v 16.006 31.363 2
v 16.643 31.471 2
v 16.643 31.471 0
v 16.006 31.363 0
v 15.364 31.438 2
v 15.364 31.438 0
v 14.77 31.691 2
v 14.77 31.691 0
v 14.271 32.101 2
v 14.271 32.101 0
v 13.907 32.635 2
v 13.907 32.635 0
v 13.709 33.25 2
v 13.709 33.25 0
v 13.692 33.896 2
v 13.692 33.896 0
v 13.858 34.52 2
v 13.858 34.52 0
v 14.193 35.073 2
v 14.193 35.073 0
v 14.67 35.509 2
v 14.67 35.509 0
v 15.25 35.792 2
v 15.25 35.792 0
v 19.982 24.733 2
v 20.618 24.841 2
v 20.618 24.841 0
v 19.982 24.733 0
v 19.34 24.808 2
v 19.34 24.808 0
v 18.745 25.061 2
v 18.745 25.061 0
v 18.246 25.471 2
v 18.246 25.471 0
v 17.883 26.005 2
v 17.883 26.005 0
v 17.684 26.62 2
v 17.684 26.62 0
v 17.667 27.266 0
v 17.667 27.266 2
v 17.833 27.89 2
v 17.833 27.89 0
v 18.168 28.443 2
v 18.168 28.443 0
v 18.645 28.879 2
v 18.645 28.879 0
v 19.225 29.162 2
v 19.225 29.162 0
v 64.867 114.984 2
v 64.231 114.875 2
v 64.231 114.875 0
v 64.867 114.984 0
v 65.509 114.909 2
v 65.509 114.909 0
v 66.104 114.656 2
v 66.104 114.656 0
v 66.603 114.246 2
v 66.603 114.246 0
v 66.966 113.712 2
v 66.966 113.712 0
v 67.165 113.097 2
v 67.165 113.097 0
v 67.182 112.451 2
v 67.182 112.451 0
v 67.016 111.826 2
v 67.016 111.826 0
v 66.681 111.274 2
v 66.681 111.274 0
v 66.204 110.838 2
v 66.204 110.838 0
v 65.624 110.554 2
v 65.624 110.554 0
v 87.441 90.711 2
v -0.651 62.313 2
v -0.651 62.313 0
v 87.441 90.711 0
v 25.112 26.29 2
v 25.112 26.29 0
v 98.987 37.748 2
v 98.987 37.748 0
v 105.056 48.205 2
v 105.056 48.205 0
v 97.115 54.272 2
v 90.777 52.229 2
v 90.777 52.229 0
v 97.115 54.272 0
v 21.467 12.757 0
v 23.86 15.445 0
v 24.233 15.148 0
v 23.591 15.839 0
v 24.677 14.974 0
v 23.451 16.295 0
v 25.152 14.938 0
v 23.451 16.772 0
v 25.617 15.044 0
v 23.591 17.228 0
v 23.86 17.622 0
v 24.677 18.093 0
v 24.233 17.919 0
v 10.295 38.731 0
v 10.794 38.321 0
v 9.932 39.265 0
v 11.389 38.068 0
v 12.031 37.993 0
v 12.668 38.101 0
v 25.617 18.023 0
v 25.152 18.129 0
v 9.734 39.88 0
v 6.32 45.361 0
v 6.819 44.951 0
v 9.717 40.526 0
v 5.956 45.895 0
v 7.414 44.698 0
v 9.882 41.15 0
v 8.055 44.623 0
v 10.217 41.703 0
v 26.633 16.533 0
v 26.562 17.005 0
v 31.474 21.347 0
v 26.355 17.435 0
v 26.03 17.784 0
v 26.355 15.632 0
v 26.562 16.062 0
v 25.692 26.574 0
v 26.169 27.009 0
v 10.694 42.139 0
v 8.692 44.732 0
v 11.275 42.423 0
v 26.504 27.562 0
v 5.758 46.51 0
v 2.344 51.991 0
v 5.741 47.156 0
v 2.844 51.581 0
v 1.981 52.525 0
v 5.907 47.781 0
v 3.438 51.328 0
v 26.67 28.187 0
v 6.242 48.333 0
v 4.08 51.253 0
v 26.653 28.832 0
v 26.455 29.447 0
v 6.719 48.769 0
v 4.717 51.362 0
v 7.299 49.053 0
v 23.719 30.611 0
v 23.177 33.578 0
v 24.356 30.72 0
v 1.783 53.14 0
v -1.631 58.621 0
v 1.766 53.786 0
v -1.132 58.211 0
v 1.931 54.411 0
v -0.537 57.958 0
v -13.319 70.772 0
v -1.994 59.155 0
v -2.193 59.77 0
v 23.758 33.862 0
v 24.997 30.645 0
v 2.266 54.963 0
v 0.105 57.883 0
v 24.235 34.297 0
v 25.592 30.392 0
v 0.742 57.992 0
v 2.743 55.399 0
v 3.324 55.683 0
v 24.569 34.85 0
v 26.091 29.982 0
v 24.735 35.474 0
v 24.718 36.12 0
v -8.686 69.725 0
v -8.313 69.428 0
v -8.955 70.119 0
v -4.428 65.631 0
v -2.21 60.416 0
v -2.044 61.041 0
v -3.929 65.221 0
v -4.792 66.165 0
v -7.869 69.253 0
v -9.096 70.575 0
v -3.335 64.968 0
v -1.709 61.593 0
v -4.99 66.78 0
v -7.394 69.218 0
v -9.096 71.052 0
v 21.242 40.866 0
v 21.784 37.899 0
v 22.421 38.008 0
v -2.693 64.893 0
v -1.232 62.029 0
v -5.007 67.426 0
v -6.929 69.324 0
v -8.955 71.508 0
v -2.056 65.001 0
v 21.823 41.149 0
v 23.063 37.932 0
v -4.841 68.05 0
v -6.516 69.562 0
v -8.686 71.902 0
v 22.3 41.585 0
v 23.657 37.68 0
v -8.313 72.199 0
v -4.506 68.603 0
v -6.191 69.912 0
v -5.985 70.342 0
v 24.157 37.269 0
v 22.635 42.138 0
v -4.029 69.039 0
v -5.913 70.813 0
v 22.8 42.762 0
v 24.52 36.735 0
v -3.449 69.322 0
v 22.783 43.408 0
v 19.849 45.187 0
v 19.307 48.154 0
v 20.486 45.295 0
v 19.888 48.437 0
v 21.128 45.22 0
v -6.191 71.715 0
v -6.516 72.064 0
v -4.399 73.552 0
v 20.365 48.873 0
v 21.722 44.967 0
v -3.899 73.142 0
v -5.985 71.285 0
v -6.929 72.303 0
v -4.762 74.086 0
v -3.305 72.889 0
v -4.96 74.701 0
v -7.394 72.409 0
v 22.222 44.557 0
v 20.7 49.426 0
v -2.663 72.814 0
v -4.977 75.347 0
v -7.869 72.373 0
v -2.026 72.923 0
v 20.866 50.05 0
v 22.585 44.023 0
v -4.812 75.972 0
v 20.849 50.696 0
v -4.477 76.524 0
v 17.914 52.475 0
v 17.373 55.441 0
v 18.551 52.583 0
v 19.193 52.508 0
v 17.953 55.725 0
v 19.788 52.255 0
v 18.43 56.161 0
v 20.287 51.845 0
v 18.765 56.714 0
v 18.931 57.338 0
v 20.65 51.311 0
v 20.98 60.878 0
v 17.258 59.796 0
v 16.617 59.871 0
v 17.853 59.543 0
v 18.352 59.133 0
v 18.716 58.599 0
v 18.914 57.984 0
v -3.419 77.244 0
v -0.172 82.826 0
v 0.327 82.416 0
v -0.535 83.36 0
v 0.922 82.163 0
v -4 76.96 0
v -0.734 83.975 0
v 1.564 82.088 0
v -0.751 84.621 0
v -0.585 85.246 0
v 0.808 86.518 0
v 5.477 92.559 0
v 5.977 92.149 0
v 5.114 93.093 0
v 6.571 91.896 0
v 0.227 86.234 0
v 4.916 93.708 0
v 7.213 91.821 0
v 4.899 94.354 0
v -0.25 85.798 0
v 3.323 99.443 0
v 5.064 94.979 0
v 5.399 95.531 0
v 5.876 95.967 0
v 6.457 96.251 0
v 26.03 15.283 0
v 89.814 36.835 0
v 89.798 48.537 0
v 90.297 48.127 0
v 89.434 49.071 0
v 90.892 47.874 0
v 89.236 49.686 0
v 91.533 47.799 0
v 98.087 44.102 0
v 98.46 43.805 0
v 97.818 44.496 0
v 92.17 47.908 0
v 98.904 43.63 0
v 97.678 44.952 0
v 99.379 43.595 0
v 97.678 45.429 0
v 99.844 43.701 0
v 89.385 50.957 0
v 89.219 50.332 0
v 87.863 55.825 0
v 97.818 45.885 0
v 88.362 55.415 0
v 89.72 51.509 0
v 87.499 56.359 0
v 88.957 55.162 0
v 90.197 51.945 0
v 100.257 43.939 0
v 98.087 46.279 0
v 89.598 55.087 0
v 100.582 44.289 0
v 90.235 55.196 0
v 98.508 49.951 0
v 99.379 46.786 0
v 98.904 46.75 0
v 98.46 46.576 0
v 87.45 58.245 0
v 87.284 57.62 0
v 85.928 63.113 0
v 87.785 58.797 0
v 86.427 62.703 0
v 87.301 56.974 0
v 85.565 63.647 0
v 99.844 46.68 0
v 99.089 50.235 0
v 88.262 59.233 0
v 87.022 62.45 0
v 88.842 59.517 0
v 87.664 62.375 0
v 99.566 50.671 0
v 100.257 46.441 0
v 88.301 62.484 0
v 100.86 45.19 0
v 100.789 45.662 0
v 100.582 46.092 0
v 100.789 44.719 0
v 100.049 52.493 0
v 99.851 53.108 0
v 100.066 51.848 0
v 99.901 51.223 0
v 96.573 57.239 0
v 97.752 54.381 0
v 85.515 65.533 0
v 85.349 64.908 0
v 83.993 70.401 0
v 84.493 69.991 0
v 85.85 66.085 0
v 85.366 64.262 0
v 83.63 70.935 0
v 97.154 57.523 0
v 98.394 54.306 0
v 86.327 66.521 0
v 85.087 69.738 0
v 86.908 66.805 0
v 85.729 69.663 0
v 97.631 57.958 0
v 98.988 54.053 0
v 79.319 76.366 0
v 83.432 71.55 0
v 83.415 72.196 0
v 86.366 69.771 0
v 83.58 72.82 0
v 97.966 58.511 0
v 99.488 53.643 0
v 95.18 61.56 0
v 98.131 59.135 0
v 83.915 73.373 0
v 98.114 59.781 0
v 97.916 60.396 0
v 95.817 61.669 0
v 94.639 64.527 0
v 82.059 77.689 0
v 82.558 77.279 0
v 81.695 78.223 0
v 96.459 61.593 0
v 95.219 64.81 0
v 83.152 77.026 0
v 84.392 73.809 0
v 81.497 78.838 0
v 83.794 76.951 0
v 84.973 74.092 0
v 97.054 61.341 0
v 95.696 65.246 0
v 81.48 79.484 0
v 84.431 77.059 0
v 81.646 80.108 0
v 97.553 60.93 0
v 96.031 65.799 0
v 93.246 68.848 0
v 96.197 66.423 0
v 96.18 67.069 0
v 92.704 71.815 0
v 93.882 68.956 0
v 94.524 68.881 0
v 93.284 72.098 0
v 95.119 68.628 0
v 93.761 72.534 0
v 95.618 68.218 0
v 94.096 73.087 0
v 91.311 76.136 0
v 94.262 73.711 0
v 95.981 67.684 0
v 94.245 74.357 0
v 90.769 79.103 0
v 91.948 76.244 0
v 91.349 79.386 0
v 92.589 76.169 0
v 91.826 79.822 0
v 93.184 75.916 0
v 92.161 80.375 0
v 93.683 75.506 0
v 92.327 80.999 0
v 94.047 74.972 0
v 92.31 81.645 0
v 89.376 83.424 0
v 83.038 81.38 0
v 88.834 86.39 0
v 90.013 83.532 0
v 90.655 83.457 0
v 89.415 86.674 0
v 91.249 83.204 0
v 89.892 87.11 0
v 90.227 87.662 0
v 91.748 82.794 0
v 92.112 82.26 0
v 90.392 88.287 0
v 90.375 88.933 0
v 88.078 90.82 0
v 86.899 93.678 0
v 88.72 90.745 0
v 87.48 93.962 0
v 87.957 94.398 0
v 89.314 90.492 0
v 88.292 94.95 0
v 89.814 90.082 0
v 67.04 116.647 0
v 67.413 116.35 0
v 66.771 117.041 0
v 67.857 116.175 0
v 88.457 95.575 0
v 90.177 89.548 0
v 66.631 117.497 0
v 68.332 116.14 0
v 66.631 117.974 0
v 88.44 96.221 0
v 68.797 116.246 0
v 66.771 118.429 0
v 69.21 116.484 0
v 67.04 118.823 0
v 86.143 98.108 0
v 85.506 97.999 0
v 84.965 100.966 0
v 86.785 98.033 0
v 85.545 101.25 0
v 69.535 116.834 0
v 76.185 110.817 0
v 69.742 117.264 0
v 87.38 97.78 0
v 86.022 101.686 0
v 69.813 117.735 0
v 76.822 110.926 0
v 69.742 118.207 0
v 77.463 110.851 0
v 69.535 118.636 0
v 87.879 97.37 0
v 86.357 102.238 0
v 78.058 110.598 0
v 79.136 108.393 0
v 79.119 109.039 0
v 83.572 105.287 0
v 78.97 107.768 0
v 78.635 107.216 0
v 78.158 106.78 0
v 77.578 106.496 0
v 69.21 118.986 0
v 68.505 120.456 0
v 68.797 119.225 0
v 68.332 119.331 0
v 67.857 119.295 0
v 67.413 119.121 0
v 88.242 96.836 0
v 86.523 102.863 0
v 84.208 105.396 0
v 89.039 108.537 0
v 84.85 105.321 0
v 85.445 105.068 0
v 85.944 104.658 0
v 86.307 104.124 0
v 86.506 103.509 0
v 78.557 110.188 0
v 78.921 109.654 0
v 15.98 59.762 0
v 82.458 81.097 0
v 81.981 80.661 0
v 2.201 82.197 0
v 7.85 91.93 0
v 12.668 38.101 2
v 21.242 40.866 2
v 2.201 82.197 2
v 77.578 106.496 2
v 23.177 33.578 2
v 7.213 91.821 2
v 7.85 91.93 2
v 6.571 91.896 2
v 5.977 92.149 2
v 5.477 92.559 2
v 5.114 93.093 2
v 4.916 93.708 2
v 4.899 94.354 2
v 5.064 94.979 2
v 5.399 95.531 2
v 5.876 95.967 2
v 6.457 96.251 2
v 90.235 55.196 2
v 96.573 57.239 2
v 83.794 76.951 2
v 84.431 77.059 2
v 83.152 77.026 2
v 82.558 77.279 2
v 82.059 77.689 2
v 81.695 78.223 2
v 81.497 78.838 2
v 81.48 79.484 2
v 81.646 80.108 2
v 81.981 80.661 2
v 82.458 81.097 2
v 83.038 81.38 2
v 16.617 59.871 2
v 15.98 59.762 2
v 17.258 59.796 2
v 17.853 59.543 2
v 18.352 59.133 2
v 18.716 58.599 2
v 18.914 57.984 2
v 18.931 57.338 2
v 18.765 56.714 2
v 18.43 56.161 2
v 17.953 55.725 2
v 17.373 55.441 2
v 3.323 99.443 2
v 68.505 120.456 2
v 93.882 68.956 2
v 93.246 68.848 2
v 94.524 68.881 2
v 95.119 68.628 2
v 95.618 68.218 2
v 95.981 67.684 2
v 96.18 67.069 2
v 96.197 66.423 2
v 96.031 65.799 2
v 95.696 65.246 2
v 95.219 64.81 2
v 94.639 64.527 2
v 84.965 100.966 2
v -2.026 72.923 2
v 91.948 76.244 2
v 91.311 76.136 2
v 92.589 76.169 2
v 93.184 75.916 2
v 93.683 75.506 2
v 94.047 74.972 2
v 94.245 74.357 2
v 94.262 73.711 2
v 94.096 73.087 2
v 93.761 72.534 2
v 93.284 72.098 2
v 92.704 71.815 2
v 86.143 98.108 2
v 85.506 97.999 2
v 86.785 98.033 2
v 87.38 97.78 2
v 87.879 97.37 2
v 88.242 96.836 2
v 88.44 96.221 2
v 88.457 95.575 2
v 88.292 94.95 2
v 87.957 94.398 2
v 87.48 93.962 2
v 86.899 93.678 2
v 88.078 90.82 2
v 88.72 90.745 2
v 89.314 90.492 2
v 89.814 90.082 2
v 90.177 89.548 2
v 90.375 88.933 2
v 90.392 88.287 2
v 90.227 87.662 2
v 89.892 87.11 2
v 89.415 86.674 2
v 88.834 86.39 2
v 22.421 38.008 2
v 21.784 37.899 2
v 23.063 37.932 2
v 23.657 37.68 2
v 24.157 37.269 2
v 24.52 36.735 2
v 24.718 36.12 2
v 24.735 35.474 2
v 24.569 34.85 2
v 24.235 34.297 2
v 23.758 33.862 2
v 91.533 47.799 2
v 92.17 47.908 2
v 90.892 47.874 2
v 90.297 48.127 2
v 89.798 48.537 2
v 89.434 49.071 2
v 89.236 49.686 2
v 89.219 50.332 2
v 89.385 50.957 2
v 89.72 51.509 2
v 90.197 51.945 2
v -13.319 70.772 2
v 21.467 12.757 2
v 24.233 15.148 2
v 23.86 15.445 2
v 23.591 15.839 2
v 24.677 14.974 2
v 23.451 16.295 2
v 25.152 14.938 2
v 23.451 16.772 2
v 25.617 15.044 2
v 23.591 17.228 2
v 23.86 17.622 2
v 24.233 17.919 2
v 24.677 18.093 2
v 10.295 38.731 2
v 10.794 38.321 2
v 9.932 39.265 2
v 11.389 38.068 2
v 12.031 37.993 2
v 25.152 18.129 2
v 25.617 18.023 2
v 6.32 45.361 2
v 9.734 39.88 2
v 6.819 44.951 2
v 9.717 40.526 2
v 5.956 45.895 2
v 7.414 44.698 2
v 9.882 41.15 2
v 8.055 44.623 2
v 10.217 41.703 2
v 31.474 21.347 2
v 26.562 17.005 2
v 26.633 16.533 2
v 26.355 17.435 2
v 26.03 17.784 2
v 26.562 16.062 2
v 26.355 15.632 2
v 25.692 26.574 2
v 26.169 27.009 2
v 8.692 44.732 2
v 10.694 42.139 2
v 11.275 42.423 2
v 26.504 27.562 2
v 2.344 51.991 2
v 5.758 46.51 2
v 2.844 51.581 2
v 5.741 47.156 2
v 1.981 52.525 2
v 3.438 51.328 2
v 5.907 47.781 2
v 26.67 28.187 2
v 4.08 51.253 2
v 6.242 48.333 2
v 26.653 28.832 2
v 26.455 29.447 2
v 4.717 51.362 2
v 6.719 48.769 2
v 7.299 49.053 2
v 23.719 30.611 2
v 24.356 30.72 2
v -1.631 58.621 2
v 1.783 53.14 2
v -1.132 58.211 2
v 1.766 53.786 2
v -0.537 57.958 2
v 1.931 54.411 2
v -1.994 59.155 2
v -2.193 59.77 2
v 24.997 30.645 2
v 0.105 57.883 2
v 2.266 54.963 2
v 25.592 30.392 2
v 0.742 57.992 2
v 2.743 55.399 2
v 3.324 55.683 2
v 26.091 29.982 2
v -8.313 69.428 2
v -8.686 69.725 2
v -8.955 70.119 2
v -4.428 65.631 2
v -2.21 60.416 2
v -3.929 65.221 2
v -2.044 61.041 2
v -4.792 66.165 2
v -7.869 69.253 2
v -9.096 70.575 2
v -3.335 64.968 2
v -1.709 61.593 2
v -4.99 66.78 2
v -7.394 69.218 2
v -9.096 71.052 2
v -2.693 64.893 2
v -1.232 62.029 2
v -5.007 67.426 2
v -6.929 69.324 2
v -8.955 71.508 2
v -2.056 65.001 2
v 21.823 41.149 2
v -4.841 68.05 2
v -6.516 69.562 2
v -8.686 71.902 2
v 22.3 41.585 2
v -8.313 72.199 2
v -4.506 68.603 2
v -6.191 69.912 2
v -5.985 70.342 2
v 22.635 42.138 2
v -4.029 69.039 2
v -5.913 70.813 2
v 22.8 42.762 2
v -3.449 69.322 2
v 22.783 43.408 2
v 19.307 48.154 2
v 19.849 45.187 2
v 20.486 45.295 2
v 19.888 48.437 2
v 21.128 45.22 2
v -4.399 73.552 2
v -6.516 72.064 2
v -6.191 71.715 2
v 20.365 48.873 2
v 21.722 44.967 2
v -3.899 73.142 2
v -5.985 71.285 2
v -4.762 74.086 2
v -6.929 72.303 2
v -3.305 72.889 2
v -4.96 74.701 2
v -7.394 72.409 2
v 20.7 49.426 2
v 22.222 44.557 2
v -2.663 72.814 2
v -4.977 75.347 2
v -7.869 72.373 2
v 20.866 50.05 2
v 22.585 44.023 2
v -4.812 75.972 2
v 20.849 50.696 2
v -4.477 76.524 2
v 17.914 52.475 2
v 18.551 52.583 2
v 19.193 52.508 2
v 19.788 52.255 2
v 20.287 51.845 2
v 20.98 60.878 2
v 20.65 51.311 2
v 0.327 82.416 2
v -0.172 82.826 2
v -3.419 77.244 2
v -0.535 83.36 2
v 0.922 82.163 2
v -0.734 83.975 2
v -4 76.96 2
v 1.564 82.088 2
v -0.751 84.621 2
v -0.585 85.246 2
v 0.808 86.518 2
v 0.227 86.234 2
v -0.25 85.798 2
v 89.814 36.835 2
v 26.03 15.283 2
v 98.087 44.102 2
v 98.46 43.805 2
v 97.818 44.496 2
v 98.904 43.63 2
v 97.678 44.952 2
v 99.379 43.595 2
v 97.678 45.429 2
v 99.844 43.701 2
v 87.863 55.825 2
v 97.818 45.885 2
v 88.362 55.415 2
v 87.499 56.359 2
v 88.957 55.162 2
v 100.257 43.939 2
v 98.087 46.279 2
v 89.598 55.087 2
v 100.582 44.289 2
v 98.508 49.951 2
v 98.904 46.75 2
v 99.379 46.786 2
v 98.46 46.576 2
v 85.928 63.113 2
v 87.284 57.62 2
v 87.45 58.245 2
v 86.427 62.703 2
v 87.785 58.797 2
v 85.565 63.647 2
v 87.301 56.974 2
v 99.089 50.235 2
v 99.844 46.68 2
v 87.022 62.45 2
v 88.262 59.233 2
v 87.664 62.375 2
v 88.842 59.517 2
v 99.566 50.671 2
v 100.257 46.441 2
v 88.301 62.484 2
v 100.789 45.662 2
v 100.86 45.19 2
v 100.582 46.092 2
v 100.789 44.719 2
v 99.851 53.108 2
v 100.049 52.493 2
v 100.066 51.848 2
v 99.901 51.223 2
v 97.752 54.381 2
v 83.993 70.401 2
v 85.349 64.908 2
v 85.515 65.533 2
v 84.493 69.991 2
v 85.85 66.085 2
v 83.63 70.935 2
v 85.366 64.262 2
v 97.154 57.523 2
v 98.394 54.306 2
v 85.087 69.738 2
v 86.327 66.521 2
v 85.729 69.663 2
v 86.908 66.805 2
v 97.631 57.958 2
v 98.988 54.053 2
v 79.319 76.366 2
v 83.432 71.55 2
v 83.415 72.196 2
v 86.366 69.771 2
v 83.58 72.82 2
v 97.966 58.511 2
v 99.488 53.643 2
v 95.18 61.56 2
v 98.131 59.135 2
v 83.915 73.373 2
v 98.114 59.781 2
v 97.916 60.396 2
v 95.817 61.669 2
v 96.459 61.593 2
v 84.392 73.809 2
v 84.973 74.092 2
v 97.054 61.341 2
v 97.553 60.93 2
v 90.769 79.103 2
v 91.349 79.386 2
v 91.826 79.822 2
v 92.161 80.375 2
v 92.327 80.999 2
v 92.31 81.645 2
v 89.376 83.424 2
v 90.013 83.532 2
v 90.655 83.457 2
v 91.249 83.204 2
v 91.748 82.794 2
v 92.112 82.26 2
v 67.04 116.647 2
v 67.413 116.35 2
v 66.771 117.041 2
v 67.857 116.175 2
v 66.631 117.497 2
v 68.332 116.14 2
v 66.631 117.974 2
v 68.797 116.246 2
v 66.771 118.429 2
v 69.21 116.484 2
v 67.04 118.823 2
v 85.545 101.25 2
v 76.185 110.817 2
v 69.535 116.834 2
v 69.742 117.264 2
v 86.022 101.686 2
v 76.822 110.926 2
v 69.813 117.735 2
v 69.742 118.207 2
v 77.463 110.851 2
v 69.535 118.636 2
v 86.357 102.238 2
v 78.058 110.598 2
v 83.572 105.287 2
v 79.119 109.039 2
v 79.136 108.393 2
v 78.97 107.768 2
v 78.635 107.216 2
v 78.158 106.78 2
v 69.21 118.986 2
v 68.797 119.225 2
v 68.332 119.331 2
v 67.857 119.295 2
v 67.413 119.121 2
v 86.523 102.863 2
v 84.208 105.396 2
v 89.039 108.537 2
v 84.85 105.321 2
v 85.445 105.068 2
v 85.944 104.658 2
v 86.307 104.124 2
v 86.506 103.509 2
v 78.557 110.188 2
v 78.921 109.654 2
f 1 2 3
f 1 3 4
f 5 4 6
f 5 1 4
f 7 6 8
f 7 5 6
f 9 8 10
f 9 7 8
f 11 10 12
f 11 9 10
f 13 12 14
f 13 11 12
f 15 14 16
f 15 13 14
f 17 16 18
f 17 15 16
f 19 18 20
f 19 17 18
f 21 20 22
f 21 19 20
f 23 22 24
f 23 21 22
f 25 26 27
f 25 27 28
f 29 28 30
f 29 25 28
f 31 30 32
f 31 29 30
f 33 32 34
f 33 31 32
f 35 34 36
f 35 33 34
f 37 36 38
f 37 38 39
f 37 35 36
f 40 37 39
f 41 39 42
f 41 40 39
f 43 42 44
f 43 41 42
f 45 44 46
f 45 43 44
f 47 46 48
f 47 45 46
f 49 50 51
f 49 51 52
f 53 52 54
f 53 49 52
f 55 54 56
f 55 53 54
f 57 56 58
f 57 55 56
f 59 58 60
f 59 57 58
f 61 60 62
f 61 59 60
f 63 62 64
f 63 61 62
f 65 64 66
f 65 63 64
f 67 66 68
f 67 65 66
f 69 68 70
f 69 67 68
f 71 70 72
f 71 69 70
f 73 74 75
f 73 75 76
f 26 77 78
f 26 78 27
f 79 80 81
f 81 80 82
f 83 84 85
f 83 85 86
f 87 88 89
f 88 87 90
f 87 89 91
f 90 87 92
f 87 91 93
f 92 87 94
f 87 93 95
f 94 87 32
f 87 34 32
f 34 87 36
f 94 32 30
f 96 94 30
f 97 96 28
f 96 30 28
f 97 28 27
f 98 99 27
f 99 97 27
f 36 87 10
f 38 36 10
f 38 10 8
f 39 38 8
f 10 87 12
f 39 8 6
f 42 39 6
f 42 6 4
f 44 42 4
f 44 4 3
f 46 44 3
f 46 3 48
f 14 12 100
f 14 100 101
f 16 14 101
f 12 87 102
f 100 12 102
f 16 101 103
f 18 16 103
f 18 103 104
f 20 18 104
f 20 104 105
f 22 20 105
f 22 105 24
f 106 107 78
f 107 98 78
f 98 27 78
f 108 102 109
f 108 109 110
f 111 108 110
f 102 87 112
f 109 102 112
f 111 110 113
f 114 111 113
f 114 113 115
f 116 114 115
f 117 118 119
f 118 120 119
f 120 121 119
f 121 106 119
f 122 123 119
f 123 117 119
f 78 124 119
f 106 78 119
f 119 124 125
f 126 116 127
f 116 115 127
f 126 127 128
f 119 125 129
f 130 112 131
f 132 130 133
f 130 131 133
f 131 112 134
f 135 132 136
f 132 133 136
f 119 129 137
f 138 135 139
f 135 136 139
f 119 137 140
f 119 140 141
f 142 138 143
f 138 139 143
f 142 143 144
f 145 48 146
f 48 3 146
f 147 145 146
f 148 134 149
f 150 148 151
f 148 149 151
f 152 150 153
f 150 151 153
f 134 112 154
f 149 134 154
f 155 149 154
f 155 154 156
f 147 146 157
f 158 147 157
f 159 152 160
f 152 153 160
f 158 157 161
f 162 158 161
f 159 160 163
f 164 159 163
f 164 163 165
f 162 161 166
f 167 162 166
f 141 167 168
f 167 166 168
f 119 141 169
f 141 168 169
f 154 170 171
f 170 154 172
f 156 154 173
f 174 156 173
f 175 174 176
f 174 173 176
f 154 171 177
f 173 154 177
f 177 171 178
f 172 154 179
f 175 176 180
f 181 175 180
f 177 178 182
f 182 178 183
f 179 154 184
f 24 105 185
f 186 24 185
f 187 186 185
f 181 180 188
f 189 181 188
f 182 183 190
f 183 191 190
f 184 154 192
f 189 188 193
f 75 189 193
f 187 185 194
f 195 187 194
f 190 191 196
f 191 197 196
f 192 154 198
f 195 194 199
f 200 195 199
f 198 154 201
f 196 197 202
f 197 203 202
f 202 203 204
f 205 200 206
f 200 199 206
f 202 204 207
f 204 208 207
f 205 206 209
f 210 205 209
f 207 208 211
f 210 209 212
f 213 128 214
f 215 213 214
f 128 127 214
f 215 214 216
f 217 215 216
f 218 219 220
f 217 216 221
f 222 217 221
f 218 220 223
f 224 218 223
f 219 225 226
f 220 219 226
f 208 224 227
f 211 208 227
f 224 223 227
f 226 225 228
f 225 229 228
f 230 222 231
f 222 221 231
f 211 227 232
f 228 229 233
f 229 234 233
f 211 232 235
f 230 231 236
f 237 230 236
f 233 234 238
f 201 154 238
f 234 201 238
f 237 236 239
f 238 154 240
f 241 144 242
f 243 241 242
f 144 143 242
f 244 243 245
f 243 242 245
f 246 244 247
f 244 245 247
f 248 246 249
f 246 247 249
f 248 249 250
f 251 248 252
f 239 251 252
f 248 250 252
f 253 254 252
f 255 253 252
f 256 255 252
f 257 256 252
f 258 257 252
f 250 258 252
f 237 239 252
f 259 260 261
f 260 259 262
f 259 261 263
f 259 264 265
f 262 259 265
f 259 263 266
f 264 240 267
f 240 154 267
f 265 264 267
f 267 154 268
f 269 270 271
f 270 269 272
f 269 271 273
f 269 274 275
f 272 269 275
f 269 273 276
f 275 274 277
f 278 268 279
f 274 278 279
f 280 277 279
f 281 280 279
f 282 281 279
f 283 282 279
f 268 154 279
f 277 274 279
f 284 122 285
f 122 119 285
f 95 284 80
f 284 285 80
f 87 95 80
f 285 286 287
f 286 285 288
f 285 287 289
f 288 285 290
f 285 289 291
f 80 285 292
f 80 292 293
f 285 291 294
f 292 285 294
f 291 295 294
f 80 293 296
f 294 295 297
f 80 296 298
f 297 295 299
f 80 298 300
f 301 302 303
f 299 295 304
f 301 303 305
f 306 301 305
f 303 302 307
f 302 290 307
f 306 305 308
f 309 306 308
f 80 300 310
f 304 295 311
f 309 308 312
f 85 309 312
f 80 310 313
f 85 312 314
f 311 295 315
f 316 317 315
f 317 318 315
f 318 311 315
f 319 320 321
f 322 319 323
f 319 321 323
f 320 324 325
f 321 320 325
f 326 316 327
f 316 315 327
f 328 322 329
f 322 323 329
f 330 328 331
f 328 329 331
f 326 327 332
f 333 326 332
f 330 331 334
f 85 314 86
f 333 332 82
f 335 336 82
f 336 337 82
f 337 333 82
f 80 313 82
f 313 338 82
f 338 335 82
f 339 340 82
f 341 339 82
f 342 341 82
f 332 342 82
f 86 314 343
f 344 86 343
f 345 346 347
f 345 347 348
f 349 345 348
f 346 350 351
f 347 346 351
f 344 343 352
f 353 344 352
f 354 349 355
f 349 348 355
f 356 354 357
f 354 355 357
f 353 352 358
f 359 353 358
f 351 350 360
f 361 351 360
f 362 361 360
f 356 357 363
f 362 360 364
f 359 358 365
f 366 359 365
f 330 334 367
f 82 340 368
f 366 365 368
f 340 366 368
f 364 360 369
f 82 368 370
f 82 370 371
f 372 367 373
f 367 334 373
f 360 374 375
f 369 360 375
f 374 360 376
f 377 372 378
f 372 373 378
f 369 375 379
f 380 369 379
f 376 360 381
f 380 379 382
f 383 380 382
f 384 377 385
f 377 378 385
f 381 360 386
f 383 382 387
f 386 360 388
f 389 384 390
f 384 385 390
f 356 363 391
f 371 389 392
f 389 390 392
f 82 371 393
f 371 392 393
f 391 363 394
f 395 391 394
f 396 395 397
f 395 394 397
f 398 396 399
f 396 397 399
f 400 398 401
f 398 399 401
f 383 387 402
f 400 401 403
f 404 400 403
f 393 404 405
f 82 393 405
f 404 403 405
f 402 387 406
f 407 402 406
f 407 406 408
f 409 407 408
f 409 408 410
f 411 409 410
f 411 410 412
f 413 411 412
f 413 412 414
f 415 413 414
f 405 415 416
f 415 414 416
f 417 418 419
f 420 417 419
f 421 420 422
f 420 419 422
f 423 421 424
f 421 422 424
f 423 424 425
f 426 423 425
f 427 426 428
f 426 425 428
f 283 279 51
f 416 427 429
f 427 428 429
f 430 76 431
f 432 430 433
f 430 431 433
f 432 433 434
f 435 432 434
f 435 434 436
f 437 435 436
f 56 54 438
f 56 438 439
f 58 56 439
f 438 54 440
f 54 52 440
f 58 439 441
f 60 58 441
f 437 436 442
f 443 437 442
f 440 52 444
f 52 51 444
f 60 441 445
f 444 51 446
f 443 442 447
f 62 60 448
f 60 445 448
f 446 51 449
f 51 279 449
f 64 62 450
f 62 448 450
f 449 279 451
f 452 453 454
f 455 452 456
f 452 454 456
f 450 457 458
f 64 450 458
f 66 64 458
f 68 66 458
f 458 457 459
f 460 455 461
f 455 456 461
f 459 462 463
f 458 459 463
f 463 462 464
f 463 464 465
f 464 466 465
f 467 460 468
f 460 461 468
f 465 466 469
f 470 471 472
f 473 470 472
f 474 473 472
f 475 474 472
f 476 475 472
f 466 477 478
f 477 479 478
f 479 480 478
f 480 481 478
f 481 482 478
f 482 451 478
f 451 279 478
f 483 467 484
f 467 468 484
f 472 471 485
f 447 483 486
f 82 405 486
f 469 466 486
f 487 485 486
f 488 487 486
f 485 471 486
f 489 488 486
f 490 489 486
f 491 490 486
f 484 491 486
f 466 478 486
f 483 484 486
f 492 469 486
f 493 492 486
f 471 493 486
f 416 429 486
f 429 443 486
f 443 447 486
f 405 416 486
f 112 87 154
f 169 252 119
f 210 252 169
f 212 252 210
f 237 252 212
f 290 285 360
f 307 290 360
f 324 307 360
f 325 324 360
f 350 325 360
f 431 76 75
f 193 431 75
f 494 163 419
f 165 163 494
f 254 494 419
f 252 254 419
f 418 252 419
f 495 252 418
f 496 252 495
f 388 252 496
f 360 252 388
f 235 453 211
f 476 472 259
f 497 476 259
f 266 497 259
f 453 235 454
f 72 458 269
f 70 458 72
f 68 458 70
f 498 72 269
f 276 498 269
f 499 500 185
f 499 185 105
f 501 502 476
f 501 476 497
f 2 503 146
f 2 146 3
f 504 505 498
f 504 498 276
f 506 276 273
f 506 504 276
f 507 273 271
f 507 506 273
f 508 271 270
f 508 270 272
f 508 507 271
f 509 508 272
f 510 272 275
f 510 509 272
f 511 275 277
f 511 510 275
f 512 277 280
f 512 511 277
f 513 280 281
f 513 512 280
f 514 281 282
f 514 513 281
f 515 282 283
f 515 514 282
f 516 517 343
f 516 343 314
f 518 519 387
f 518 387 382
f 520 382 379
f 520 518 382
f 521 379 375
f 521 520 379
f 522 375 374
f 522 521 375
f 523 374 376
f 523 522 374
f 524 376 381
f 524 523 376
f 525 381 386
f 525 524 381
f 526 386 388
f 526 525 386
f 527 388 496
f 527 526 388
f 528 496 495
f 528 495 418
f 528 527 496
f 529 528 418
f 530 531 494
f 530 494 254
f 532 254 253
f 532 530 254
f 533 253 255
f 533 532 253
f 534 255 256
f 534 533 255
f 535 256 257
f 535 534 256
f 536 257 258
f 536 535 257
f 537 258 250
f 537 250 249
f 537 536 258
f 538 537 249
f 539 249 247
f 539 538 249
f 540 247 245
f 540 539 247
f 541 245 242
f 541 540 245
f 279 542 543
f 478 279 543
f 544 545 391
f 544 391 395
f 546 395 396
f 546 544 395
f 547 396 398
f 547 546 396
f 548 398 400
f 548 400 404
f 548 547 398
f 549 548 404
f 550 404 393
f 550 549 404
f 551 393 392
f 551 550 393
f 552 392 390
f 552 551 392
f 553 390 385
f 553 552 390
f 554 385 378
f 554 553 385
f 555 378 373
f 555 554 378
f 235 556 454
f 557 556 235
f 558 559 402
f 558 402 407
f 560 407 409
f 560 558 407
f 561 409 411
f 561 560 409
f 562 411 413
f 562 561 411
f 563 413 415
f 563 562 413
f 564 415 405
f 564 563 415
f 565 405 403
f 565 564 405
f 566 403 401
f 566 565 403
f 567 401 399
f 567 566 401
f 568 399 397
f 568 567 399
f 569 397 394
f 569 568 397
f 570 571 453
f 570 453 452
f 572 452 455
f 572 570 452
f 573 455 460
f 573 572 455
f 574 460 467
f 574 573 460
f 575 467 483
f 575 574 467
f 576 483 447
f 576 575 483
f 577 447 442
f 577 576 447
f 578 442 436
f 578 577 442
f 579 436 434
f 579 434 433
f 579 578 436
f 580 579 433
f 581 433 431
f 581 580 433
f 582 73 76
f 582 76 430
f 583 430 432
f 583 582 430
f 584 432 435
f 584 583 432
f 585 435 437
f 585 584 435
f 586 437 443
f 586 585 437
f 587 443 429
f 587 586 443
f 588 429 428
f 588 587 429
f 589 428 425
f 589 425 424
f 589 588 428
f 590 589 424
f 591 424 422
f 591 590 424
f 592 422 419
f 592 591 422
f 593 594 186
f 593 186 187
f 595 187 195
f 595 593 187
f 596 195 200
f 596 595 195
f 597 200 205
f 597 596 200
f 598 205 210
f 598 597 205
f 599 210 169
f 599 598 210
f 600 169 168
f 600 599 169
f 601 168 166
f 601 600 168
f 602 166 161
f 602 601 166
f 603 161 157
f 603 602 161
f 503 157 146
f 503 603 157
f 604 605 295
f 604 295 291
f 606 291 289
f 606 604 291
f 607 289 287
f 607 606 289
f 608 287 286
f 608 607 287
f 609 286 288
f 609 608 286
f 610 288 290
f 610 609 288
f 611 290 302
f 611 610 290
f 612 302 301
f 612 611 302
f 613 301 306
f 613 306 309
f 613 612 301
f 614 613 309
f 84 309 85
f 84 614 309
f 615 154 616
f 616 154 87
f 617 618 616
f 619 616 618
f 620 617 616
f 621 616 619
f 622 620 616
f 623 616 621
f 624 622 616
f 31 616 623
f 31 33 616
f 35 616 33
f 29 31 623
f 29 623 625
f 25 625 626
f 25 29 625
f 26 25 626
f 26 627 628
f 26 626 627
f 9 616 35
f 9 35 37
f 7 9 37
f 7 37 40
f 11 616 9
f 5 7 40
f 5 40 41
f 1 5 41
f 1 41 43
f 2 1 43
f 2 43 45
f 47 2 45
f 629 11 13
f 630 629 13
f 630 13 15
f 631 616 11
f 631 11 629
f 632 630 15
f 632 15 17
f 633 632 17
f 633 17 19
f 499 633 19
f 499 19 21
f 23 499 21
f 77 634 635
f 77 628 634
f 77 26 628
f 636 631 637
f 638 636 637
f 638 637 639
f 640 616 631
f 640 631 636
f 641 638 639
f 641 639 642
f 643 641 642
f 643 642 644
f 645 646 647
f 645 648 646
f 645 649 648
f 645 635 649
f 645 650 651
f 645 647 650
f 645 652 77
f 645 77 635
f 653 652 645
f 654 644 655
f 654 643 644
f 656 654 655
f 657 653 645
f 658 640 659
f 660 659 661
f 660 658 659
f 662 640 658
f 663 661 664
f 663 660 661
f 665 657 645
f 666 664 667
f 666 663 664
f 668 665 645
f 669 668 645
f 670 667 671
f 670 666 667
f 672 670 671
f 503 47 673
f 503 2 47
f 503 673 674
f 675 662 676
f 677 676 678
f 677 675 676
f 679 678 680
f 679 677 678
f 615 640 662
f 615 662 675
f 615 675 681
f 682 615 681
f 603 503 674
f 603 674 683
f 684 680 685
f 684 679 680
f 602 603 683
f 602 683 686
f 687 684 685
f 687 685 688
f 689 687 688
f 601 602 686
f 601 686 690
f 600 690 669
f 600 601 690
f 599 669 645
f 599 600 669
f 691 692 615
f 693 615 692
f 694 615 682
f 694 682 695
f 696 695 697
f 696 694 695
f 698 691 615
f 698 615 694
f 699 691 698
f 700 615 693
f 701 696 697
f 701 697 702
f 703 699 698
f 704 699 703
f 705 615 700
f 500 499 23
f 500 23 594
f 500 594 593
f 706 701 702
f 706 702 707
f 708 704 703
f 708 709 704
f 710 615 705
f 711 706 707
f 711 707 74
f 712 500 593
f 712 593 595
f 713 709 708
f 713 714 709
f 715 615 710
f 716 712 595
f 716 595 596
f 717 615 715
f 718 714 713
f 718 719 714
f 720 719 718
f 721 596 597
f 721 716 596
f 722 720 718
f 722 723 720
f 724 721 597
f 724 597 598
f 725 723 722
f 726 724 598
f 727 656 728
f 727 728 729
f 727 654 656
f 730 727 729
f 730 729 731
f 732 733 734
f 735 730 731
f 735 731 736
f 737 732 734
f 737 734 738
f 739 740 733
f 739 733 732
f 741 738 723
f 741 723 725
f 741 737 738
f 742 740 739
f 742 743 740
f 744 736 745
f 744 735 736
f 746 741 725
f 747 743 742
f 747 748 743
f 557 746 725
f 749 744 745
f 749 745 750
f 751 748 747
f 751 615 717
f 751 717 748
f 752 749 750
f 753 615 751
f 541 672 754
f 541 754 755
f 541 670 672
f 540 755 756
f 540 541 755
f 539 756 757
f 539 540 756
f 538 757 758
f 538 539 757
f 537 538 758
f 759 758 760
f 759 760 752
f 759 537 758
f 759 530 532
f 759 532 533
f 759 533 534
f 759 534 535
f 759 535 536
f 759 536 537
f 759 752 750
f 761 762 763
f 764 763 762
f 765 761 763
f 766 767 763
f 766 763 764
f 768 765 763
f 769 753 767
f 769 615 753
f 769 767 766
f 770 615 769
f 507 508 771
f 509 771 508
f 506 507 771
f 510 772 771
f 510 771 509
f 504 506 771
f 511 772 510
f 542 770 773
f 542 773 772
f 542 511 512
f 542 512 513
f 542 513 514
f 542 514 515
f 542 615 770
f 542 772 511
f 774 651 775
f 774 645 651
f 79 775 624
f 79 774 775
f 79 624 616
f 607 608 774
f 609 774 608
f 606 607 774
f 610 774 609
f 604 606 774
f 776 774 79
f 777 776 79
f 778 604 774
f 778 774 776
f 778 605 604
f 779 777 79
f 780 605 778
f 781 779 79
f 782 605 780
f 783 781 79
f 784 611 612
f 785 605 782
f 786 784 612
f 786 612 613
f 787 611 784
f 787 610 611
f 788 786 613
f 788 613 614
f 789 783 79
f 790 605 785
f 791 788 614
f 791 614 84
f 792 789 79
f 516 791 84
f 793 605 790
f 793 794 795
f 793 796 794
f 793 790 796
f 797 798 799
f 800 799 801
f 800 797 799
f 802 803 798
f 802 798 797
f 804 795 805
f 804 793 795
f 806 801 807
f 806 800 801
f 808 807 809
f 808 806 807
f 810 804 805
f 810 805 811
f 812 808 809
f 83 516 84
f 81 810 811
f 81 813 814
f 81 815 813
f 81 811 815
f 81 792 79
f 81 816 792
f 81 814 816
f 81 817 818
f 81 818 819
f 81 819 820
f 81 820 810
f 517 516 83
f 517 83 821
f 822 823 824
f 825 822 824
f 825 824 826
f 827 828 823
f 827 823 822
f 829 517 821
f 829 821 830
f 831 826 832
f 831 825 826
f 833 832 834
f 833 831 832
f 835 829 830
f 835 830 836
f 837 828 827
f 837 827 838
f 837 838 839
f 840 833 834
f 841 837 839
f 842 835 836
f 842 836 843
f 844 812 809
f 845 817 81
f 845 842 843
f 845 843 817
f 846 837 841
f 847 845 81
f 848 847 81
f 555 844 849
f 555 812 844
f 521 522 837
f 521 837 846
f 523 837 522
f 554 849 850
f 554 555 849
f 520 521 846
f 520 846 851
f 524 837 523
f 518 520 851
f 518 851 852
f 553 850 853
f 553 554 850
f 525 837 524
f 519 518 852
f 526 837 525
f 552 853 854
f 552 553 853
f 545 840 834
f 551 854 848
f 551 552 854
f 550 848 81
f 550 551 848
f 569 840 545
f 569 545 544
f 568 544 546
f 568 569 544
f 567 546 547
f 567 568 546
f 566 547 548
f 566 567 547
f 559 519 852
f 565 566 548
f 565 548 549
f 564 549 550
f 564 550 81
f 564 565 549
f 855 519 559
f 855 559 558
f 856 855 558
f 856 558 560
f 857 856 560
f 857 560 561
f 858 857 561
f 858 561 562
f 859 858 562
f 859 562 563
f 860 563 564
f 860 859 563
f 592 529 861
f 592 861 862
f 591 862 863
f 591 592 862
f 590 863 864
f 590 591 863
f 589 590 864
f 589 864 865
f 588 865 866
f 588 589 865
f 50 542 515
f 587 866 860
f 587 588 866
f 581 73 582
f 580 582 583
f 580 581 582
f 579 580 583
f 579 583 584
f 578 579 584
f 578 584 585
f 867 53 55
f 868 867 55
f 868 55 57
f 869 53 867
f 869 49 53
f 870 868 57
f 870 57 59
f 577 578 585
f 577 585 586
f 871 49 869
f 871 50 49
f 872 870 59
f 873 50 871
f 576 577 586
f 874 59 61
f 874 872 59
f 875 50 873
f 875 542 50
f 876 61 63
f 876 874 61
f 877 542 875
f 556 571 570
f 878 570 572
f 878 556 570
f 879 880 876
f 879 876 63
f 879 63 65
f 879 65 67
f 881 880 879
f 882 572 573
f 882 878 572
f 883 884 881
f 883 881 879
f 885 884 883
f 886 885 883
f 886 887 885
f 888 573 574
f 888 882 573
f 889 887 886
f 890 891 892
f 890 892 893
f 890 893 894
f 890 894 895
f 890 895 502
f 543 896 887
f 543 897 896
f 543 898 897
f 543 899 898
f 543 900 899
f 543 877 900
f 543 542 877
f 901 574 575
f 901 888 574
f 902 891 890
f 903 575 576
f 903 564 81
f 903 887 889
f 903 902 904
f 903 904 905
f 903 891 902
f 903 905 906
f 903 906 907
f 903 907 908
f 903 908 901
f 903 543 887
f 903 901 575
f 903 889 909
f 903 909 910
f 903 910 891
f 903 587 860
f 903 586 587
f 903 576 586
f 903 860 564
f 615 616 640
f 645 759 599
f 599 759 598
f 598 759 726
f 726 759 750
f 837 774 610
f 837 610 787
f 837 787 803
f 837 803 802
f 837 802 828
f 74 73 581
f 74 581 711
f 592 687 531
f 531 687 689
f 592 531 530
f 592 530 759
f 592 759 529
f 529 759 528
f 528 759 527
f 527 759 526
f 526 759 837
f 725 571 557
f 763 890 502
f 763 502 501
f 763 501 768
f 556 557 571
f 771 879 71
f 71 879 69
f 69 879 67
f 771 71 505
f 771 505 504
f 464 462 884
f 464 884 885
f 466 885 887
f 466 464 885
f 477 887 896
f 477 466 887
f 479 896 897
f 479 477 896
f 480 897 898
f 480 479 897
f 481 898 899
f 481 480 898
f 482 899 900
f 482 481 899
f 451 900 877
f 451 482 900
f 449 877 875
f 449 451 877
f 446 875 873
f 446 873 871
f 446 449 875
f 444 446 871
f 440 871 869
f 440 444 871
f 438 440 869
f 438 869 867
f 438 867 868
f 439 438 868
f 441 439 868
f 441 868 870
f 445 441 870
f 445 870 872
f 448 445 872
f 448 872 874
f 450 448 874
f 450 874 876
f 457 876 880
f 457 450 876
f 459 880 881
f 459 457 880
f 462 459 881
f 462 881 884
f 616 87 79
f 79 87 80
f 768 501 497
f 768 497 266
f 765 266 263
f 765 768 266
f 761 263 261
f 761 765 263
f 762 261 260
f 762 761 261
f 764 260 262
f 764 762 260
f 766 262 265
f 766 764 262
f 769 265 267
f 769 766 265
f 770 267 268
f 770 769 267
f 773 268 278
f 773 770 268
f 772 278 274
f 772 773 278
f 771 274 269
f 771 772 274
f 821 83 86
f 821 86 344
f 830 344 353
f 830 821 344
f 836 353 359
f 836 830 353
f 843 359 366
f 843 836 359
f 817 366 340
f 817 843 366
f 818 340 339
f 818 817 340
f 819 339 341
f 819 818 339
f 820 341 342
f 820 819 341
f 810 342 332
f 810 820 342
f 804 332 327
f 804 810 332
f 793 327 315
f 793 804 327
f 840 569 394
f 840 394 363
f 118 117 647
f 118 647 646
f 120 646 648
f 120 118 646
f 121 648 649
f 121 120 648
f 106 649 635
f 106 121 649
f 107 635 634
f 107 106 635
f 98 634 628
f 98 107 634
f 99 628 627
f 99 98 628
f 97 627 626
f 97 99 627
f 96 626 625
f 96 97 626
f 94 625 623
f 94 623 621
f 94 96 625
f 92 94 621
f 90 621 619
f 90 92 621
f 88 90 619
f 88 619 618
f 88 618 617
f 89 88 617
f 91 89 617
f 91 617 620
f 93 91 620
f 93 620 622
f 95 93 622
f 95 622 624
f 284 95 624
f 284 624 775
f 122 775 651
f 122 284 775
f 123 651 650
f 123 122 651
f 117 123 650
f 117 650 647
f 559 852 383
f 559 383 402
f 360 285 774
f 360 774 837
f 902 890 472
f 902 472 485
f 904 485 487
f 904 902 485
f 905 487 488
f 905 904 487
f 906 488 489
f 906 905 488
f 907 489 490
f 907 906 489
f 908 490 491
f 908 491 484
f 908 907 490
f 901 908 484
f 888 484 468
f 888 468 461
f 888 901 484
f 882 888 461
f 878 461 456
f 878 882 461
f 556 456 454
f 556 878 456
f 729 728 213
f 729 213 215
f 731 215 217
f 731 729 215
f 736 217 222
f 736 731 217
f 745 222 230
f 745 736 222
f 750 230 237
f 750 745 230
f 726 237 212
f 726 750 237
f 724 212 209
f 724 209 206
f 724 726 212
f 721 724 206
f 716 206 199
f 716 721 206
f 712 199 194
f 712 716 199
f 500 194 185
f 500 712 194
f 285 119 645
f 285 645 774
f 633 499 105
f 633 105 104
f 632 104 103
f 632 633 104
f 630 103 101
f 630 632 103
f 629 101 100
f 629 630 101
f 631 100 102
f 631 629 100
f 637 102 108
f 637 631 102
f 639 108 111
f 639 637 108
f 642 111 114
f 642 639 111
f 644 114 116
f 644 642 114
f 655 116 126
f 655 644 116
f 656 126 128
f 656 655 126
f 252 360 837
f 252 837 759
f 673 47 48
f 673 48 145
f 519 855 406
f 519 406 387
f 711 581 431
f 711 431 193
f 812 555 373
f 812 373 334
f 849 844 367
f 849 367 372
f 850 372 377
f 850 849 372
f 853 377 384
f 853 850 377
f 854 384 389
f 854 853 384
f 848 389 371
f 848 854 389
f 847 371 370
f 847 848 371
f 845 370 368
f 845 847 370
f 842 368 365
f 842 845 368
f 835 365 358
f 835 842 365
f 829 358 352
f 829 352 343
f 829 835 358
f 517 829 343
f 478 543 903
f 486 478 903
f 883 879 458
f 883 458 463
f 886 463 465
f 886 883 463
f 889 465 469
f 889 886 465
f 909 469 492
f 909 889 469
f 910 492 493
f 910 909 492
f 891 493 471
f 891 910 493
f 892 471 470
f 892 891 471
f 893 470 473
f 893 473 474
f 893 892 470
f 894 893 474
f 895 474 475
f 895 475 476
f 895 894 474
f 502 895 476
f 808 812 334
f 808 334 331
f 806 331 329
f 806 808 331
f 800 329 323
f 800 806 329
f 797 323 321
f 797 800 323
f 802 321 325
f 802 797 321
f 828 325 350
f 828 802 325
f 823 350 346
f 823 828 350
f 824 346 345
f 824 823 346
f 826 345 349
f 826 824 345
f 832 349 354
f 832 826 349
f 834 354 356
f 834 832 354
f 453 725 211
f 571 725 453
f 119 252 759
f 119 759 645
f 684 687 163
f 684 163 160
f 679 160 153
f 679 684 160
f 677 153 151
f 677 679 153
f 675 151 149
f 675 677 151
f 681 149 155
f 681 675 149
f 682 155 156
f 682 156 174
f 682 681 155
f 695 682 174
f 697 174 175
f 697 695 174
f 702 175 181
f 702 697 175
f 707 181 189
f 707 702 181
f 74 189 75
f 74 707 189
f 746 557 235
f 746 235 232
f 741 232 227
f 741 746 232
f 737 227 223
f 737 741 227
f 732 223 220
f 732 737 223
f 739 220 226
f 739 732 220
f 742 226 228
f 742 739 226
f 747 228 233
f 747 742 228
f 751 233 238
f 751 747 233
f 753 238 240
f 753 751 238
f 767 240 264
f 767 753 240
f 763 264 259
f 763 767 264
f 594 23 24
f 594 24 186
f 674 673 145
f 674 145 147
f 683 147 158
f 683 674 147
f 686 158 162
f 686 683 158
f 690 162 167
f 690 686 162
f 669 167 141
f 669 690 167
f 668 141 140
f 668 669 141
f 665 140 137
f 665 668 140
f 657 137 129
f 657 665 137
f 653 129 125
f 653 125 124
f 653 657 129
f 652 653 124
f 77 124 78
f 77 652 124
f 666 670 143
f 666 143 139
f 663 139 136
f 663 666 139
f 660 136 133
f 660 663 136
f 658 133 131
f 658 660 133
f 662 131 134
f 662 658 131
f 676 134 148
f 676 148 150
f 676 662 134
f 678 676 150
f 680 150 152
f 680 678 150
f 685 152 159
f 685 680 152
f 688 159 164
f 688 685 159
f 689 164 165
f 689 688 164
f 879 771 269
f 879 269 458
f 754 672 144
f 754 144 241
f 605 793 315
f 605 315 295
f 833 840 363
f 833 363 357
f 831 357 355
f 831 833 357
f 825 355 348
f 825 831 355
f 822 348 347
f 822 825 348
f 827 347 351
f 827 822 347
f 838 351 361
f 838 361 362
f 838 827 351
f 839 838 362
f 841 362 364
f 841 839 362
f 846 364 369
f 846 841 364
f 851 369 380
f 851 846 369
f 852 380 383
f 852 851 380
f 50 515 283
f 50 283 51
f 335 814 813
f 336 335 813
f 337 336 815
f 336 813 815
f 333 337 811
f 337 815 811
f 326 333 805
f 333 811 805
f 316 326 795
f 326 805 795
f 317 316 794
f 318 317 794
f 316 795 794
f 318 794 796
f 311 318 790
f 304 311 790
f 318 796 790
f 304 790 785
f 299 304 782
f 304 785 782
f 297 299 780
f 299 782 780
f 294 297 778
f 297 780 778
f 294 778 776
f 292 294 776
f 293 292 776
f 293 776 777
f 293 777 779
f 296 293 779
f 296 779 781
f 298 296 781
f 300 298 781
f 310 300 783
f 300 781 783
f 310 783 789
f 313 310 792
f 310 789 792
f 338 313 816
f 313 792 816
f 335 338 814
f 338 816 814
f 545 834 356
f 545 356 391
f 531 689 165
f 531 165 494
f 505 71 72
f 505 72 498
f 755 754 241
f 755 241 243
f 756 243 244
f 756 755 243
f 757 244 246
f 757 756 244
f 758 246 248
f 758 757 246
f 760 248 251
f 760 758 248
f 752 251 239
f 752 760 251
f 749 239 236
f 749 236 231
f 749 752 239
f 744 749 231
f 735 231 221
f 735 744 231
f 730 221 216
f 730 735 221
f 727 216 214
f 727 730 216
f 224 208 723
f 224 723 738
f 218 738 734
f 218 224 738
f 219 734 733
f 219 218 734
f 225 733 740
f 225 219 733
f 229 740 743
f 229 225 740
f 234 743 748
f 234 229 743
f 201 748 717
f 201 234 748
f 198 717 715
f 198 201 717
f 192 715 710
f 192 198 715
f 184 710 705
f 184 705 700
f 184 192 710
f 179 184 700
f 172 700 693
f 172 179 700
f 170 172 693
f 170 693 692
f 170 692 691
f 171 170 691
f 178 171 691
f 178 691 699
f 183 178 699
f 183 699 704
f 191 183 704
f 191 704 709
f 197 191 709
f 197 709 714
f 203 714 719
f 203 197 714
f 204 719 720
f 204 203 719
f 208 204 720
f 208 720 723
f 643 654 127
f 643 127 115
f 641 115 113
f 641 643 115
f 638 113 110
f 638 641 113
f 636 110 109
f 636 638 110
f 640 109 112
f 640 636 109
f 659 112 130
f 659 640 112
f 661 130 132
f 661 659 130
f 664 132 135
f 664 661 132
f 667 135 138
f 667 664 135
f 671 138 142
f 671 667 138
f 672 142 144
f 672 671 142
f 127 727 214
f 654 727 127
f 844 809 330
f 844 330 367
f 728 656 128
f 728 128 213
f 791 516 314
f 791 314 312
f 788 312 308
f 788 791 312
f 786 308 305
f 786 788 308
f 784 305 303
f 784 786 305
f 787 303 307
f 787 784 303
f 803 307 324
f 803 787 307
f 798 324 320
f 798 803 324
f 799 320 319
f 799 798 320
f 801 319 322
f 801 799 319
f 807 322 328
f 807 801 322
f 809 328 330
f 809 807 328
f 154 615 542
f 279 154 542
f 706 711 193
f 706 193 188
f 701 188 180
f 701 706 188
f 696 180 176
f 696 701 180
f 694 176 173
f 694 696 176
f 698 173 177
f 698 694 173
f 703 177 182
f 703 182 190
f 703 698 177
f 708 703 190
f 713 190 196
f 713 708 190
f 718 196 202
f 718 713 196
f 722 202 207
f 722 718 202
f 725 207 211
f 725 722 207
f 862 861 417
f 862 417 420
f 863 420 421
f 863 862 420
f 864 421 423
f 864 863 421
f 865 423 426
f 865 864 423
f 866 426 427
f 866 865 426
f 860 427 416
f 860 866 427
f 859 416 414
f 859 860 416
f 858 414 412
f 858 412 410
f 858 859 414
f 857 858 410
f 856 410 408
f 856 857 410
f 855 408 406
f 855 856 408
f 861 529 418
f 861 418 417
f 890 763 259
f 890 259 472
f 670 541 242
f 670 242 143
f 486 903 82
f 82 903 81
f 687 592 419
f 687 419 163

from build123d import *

# Parameters (mm, degrees)
SKETCH1_R           = 1.6
BOSS_EXTRUDE1_DEPTH = 2
CUT_EXTRUDE1_DEPTH  = 2
SKETCH3_R           = 1.6
CUT_EXTRUDE2_DEPTH  = 2


with BuildPart() as part:
    # Sketch1 → Boss-Extrude1 (new body)
    with BuildSketch(Plane.XY):
        Polygon((21.467142273, 12.757289388), (98.986558646, 37.747522695), (108.606128903, 54.320788113), (91.526252569, 118.656423166), (69.674428961, 131.339810968), (5.135356345, 110.534101153), (-15.668691868, 74.691438373), align=None)
        with Locations((25.032859693, 16.533479235)):
            Circle(SKETCH1_R, mode=Mode.SUBTRACT)
        with Locations((-7.513458012, 70.813355701)):
            Circle(SKETCH1_R, mode=Mode.SUBTRACT)
        with Locations((68.212815702, 117.73514623)):
            Circle(SKETCH1_R, mode=Mode.SUBTRACT)
        Polygon((31.474266896, 21.347469407), (89.813558069, 36.835431526), (79.318927702, 76.366087142), (20.979636529, 60.878125023), align=None, mode=Mode.SUBTRACT)
    extrude(amount=BOSS_EXTRUDE1_DEPTH)

    # Sketch2 → Cut-Extrude1 (cut)
    with BuildSketch(Plane.XY.offset(2)):
        Polygon((68.505138354, 120.456079177), (89.039456874, 108.537406864), (105.056492564, 48.205227479), (108.606128903, 54.320788113), (91.526252569, 118.656423166), (69.674428961, 131.339810968), (5.135356345, 110.534101153), (-15.668691868, 74.691438373), (-13.318631122, 70.77207004), (3.322736479, 99.442976827), align=None)
    extrude(amount=-CUT_EXTRUDE1_DEPTH, mode=Mode.SUBTRACT)

    # Sketch3 → Cut-Extrude2 (cut)
    with BuildSketch(Plane.XY.offset(2)):
        with Locations((99.259718064, 45.190330298)):
            Circle(SKETCH3_R)
        with BuildLine():
            Line((6.456725485, 96.250579726), (64.230526779, 114.875342927))
            ThreePointArc((64.230526779, 114.875342927), (67.087527478, 113.411325508), (65.623510059, 110.554324808))
            Line((65.623510059, 110.554324808), (7.849708766, 91.929561608))
            ThreePointArc((7.849708766, 91.929561608), (4.992708066, 93.393579027), (6.456725485, 96.250579726))
        make_face()
        with BuildLine():
            Line((0.807577645, 86.517834494), (76.18470113, 110.817448579))
            ThreePointArc((76.18470113, 110.817448579), (79.041701829, 109.35343116), (77.57768441, 106.496430461))
            Line((77.57768441, 106.496430461), (2.200560925, 82.196816376))
            ThreePointArc((2.200560925, 82.196816376), (-0.656439775, 83.660833795), (0.807577645, 86.517834494))
        make_face()
        with BuildLine():
            Line((-3.419178071, 77.243631299), (83.571572672, 105.287175206))
            ThreePointArc((83.571572672, 105.287175206), (86.428573372, 103.823157787), (84.964555952, 100.966157087))
            Line((84.964555952, 100.966157087), (-2.02619479, 72.92261318))
            ThreePointArc((-2.02619479, 72.92261318), (-4.88319549, 74.3866306), (-3.419178071, 77.243631299))
        make_face()
        with BuildLine():
            Line((-3.448967162, 69.322420425), (85.506365232, 97.999294098))
            ThreePointArc((85.506365232, 97.999294098), (88.363365932, 96.535276679), (86.899348513, 93.678275979))
            Line((86.899348513, 93.678275979), (-2.055983882, 65.001402307))
            ThreePointArc((-2.055983882, 65.001402307), (-4.912984581, 66.465419726), (-3.448967162, 69.322420425))
        make_face()
        with BuildLine():
            Line((-0.651479152, 62.312649778), (87.441157792, 90.71141299))
            ThreePointArc((87.441157792, 90.71141299), (90.298158492, 89.247395571), (88.834141073, 86.390394871))
            Line((88.834141073, 86.390394871), (0.741504129, 57.991631659))
            ThreePointArc((0.741504129, 57.991631659), (-2.115496571, 59.455649078), (-0.651479152, 62.312649778))
        make_face()
        with BuildLine():
            Line((83.038019838, 81.380348772), (89.375950353, 83.423531882))
            ThreePointArc((89.375950353, 83.423531882), (92.232951052, 81.959514463), (90.768933633, 79.102513764))
            Line((90.768933633, 79.102513764), (84.431003119, 77.059330653))
            ThreePointArc((84.431003119, 77.059330653), (81.574002419, 78.523348073), (83.038019838, 81.380348772))
        make_face()
        with BuildLine():
            Line((3.323909307, 55.682603442), (15.979695788, 59.762498153))
            ThreePointArc((15.979695788, 59.762498153), (18.836696487, 58.298480734), (17.372679068, 55.441480034))
            Line((17.372679068, 55.441480034), (4.716892588, 51.361585323))
            ThreePointArc((4.716892588, 51.361585323), (1.859891888, 52.825602742), (3.323909307, 55.682603442))
        make_face()
        with BuildLine():
            Line((7.299297766, 49.052557106), (17.914488348, 52.474617045))
            ThreePointArc((17.914488348, 52.474617045), (20.771489047, 51.010599626), (19.307471628, 48.153598926))
            Line((19.307471628, 48.153598926), (8.692281046, 44.731538987))
            ThreePointArc((8.692281046, 44.731538987), (5.835280347, 46.195556407), (7.299297766, 49.052557106))
        make_face()
        with BuildLine():
            Line((11.274686225, 42.42251077), (19.849280908, 45.186735937))
            ThreePointArc((19.849280908, 45.186735937), (22.706281607, 43.722718518), (21.242264188, 40.865717818))
            Line((21.242264188, 40.865717818), (12.667669505, 38.101492652))
            ThreePointArc((12.667669505, 38.101492652), (9.810668805, 39.565510071), (11.274686225, 42.42251077))
        make_face()
        with BuildLine():
            Line((15.250074683, 35.792464434), (21.784073468, 37.898854829))
            ThreePointArc((21.784073468, 37.898854829), (24.641074168, 36.43483741), (23.177056748, 33.577836711))
            Line((23.177056748, 33.577836711), (16.643057964, 31.471446316))
            ThreePointArc((16.643057964, 31.471446316), (13.786057264, 32.935463735), (15.250074683, 35.792464434))
        make_face()
        with BuildLine():
            Line((19.225463142, 29.162418098), (23.718866028, 30.610973721))
            ThreePointArc((23.718866028, 30.610973721), (26.575866728, 29.146956302), (25.111849309, 26.289955603))
            Line((25.111849309, 26.289955603), (20.618446422, 24.84139998))
            ThreePointArc((20.618446422, 24.84139998), (17.761445723, 26.305417399), (19.225463142, 29.162418098))
        make_face()
        with BuildLine():
            Line((84.972812398, 74.092467664), (91.310742913, 76.135650774))
            ThreePointArc((91.310742913, 76.135650774), (94.167743612, 74.671633355), (92.703726193, 71.814632656))
            Line((92.703726193, 71.814632656), (86.365795679, 69.771449546))
            ThreePointArc((86.365795679, 69.771449546), (83.508794979, 71.235466965), (84.972812398, 74.092467664))
        make_face()
        with BuildLine():
            Line((86.907604959, 66.804586556), (93.245535473, 68.847769666))
            ThreePointArc((93.245535473, 68.847769666), (96.102536172, 67.383752247), (94.638518753, 64.526751548))
            Line((94.638518753, 64.526751548), (88.300588239, 62.483568438))
            ThreePointArc((88.300588239, 62.483568438), (85.44358754, 63.947585857), (86.907604959, 66.804586556))
        make_face()
        with BuildLine():
            Line((88.842397519, 59.516705448), (95.180328033, 61.559888559))
            ThreePointArc((95.180328033, 61.559888559), (98.037328733, 60.095871139), (96.573311314, 57.23887044))
            Line((96.573311314, 57.23887044), (90.235380799, 55.19568733))
            ThreePointArc((90.235380799, 55.19568733), (87.3783801, 56.659704749), (88.842397519, 59.516705448))
        make_face()
        with BuildLine():
            Line((90.777190079, 52.228824341), (97.115120593, 54.272007451))
            ThreePointArc((97.115120593, 54.272007451), (99.972121293, 52.807990032), (98.508103874, 49.950989332))
            Line((98.508103874, 49.950989332), (92.170173359, 47.907806222))
            ThreePointArc((92.170173359, 47.907806222), (89.31317266, 49.371823641), (90.777190079, 52.228824341))
        make_face()
    extrude(amount=-CUT_EXTRUDE2_DEPTH, mode=Mode.SUBTRACT)


solid = part.part
